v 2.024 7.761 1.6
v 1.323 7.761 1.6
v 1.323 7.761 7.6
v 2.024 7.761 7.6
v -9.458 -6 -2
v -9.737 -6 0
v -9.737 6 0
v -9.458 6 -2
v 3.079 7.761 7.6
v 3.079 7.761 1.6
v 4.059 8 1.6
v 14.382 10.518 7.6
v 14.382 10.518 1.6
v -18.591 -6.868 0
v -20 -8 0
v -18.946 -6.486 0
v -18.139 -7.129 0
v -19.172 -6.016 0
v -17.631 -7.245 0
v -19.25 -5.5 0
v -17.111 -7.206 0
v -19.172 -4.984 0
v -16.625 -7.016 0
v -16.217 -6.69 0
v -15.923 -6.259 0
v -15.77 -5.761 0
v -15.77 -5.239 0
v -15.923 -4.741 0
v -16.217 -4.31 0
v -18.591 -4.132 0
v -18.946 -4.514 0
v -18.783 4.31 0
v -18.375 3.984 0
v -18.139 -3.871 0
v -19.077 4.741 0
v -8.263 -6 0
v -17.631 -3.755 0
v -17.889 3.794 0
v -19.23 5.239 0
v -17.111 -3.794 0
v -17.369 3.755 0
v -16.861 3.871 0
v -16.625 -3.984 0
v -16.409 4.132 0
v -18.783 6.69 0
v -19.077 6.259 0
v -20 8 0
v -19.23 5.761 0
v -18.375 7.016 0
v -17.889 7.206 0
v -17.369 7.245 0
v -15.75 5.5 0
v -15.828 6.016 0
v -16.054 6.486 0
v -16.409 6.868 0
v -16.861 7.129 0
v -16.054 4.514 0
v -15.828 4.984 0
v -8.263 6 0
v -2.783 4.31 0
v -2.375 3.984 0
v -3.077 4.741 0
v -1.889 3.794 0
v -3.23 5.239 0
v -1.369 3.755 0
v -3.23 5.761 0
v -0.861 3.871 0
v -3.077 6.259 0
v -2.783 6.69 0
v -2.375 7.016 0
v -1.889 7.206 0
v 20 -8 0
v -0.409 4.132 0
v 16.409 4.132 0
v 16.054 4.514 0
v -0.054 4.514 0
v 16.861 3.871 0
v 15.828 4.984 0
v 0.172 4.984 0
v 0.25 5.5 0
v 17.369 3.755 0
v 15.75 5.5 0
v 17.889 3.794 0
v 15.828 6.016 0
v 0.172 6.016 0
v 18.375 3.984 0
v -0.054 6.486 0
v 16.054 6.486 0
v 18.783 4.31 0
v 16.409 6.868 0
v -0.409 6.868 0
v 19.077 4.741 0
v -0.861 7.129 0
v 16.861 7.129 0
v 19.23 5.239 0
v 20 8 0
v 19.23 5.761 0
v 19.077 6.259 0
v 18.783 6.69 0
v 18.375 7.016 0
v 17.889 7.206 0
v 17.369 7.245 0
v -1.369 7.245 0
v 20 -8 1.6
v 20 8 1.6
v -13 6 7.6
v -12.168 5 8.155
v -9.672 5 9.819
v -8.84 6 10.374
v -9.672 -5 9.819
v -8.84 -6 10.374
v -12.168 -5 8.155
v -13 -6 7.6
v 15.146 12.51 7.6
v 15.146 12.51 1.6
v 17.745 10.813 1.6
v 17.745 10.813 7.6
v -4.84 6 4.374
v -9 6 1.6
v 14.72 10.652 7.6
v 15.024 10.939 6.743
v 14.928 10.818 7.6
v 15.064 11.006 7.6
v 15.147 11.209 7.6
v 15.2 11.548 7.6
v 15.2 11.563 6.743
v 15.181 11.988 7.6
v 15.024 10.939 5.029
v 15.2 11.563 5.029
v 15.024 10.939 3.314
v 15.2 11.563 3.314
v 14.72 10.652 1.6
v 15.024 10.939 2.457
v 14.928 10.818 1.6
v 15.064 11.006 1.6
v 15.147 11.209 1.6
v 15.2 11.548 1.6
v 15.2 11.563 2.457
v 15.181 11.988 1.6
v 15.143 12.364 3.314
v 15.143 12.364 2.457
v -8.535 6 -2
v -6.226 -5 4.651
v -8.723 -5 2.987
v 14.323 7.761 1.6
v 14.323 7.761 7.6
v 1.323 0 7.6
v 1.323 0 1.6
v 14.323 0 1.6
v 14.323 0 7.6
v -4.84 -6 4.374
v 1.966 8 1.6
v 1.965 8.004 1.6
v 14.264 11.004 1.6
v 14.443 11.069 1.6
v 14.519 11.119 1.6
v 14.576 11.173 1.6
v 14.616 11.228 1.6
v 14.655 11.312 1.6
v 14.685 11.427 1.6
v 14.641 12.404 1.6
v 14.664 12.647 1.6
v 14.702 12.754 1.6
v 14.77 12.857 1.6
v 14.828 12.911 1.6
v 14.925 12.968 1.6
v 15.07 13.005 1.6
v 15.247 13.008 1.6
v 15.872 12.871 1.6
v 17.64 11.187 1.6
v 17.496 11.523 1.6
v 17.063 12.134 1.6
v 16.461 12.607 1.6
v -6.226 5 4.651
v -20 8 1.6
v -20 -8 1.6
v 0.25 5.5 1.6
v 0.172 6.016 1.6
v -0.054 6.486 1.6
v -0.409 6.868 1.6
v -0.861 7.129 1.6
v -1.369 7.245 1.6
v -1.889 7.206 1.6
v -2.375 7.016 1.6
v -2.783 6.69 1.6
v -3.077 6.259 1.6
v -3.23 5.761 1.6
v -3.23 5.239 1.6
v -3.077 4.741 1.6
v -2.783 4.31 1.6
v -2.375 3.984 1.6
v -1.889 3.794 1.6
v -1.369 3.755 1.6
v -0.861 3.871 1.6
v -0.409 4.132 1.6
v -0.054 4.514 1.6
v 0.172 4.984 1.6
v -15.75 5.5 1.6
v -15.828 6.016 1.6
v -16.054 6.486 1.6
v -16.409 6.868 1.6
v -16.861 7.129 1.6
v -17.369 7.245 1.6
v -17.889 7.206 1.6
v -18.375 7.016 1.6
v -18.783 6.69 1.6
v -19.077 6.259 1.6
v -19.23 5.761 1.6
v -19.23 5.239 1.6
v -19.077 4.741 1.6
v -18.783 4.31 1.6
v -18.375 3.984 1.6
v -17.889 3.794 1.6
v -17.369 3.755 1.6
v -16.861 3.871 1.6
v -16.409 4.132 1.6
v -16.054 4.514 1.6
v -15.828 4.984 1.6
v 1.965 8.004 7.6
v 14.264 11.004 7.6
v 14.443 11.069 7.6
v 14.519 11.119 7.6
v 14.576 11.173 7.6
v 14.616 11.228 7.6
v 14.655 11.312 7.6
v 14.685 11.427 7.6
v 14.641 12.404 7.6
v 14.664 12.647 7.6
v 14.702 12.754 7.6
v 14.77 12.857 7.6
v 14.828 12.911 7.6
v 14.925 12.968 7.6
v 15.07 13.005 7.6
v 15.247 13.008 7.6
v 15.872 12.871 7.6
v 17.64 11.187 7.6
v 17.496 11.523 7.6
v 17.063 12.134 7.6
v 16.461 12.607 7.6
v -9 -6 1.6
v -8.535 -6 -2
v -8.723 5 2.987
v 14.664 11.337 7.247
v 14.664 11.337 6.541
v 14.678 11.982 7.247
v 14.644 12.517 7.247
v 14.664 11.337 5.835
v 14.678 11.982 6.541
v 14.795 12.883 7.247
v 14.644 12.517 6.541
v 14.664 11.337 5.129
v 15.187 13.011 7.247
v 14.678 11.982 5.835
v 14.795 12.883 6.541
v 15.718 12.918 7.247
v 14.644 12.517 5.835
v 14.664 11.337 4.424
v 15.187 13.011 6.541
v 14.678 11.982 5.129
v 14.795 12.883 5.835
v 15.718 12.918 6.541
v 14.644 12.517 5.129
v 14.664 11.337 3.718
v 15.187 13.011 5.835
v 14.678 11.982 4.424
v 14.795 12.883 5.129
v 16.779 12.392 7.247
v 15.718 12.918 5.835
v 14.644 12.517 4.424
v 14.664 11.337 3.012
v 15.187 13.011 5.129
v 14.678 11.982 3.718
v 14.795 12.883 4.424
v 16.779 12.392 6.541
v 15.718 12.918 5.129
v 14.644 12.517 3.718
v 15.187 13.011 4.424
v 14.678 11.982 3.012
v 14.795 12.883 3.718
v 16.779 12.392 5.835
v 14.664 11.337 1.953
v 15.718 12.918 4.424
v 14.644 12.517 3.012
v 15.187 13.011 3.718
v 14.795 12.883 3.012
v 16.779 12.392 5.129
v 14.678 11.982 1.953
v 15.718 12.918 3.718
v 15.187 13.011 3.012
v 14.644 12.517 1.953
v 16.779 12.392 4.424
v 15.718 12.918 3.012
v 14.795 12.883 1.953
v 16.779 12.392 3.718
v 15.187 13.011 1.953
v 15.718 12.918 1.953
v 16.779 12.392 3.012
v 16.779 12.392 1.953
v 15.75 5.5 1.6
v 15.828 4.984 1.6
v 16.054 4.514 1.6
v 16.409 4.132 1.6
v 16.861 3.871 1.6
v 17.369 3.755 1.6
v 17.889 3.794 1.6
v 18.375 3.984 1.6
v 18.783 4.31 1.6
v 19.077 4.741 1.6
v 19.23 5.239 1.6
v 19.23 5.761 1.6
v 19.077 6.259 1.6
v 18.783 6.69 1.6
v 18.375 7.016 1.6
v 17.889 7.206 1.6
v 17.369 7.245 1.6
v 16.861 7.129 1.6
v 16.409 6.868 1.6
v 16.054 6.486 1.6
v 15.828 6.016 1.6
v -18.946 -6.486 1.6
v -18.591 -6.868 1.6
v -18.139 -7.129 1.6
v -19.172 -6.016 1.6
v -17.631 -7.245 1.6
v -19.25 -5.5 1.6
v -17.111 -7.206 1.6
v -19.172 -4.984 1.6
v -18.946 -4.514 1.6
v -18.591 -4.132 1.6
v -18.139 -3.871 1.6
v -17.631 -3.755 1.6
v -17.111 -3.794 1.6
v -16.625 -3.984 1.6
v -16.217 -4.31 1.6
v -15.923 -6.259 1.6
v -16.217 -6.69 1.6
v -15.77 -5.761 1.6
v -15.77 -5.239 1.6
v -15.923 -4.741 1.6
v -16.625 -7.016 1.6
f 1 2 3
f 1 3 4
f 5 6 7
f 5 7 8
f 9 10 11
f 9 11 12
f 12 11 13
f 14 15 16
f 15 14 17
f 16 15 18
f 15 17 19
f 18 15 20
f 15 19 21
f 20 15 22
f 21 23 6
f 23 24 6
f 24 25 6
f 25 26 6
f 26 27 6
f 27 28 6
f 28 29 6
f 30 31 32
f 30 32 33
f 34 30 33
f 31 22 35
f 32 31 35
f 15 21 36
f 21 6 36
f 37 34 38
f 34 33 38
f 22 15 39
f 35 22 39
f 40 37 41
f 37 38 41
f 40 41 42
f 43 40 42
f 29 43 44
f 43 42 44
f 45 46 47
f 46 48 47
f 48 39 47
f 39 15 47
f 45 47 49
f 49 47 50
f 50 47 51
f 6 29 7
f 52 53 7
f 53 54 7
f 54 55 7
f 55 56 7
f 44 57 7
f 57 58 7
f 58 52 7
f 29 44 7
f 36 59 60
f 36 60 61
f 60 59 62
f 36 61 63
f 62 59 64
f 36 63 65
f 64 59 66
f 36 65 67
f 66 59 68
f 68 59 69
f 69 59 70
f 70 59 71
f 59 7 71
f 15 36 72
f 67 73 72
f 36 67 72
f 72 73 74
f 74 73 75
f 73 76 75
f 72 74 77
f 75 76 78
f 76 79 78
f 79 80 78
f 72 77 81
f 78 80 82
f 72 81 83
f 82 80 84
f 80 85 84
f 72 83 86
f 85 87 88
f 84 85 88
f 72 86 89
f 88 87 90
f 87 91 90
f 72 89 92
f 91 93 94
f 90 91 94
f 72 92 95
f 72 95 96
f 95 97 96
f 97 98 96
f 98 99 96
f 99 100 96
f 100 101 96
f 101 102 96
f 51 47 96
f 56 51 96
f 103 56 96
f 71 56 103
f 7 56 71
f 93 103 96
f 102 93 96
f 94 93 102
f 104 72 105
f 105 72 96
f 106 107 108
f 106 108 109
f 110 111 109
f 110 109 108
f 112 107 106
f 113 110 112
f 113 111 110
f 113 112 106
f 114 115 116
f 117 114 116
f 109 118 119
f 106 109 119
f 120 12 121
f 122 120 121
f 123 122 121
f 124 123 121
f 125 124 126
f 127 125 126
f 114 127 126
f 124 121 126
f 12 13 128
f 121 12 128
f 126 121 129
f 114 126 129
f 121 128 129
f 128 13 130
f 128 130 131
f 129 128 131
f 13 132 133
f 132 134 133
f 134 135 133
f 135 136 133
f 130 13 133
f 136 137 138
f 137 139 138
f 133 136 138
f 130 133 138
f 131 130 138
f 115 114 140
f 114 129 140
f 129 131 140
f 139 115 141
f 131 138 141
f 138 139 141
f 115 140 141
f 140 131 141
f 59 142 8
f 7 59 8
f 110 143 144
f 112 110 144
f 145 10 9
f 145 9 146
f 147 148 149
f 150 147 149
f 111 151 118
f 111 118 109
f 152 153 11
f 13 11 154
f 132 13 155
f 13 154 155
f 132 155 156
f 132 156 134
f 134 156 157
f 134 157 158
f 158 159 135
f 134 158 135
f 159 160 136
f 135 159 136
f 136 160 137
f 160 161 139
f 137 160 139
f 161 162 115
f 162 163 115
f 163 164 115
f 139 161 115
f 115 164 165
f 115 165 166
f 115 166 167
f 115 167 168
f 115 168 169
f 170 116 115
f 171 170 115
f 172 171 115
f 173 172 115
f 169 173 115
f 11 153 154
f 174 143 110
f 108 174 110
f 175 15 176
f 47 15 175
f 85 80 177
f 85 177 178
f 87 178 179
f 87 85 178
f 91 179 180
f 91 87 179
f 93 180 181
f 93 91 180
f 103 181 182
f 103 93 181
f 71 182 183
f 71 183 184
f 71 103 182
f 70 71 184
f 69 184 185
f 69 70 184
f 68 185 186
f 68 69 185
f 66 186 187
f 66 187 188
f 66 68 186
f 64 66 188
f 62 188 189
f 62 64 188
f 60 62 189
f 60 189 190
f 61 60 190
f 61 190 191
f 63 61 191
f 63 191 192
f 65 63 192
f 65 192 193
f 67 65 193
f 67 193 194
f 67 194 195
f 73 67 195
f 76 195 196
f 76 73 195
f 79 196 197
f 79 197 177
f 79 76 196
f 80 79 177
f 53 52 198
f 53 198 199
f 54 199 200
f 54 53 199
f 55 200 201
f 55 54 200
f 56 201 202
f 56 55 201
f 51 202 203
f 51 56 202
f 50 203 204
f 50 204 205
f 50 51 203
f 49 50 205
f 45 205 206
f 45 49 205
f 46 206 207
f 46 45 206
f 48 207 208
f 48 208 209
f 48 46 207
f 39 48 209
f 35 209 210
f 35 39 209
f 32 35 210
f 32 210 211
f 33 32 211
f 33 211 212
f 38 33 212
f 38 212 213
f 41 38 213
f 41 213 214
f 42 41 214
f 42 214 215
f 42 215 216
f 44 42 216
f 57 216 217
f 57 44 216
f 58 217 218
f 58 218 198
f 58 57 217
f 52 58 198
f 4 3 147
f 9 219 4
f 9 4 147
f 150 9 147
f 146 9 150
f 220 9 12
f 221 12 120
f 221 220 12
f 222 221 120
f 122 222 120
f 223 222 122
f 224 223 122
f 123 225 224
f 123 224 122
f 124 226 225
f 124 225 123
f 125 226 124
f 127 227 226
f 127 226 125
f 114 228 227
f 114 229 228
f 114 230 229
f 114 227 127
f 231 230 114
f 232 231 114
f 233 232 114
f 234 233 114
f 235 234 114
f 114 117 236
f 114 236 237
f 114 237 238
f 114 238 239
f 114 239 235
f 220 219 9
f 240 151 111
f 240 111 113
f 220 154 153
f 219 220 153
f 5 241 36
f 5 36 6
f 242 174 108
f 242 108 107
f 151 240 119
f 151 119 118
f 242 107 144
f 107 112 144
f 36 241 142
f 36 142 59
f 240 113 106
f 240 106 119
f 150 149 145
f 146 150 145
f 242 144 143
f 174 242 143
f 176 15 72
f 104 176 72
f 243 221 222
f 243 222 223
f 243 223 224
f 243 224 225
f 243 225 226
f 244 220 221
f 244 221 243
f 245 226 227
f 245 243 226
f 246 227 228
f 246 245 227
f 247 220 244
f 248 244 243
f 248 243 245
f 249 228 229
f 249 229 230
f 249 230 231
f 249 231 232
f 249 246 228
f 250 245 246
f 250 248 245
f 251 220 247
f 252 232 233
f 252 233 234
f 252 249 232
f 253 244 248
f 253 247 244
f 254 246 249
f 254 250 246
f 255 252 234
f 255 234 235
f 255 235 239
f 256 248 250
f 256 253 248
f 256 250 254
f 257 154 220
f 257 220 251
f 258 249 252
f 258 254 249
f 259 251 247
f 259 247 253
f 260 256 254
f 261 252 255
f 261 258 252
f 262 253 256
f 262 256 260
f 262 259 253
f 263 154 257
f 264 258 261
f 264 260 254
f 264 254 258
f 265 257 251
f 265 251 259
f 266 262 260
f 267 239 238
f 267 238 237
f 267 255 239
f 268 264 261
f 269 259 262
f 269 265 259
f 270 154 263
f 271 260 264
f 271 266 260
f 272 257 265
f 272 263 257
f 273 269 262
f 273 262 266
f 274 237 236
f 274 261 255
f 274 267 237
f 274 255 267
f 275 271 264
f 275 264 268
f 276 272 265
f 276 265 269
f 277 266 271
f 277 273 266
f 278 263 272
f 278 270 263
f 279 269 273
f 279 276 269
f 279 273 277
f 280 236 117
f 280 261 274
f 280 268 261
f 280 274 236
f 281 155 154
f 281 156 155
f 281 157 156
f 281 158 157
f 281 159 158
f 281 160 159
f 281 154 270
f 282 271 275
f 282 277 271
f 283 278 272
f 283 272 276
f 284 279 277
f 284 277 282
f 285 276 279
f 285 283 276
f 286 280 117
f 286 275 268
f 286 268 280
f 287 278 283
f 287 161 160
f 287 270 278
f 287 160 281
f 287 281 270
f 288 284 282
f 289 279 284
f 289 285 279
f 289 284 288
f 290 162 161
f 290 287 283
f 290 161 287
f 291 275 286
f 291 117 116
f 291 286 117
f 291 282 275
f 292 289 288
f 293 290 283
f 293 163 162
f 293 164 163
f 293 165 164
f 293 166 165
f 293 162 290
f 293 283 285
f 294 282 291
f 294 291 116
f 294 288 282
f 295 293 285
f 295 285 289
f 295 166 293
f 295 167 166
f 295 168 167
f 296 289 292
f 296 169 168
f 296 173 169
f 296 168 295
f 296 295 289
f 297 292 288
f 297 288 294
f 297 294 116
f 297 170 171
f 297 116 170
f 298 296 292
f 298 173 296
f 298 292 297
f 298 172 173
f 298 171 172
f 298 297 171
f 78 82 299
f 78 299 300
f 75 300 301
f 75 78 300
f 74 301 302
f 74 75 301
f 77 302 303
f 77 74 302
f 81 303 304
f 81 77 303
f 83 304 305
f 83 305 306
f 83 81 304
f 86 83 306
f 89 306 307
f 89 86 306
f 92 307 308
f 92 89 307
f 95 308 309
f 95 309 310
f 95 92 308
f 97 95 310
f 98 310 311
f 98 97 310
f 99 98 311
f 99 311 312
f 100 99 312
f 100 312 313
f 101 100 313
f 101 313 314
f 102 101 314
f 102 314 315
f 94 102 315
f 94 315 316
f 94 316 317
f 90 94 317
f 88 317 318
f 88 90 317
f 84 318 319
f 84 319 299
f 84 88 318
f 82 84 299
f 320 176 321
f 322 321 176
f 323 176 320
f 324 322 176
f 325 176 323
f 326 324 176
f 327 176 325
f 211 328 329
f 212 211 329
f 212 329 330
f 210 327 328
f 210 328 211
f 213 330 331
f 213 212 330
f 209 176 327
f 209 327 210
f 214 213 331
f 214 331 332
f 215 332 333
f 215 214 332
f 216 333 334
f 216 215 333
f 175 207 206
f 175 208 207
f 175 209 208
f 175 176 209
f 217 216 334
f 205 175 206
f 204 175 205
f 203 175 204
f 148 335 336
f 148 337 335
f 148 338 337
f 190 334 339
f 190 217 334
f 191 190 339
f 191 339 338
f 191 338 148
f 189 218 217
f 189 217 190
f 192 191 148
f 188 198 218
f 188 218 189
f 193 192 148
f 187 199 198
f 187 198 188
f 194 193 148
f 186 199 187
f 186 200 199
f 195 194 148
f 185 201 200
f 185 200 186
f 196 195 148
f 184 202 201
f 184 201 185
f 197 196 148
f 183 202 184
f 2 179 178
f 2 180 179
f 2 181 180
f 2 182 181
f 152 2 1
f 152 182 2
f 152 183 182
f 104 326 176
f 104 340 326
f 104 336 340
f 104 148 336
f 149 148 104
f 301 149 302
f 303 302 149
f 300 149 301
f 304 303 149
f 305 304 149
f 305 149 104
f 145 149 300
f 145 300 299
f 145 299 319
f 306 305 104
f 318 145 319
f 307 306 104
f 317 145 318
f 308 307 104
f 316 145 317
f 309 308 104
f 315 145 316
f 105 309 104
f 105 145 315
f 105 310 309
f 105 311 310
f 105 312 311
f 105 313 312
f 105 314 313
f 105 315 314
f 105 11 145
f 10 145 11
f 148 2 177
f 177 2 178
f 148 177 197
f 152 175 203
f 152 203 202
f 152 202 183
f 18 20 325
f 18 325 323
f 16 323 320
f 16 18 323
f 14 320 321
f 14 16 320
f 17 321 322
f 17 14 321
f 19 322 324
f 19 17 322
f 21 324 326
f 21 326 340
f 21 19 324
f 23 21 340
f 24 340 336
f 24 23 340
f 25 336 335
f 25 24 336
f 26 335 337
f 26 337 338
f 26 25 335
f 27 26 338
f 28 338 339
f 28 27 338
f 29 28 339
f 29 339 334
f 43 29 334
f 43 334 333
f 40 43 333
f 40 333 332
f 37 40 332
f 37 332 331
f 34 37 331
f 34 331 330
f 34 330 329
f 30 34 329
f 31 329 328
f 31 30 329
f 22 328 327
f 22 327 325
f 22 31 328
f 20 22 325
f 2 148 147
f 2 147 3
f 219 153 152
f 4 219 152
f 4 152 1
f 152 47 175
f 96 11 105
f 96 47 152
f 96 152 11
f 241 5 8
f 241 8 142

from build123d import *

# Parameters (mm, degrees)
SKETCH1_W           = 40
SKETCH1_H           = 16
SKETCH1_R           = 1.75
EXTRUDE1_DEPTH      = 1.6
SKETCH2_W           = 13
SKETCH2_H           = 7.760900167
EXTRUDE2_DEPTH      = 6
EXTRUDE_THIN1_START = -6
EXTRUDE_THIN1_DEPTH = 6
EXTRUDE3_DEPTH      = 6
EXTRUDE3_DEPTH_BACK = 6
SHELL1_T            = -1
EXTRUDE4_DEPTH      = 6
EXTRUDE4_DEPTH_BACK = 6


# Read off the part's stored shape, not the designer's step: Extrude-Thin1
with BuildPart() as part:
    # Sketch1 → Extrude1 (new body)
    with BuildSketch(Plane.XY):
        Rectangle(SKETCH1_W, SKETCH1_H)
        with Locations((-17.5, 5.5)):
            Circle(SKETCH1_R, mode=Mode.SUBTRACT)
        with Locations(Location((17.5, 5.5, 0), (0, 0, 180))):
            Circle(SKETCH1_R, mode=Mode.SUBTRACT)
        with Locations(Location((-17.5, -5.5, 0), (0, 0, 180))):
            Circle(SKETCH1_R, mode=Mode.SUBTRACT)
        with Locations((-1.5, 5.5)):
            Circle(SKETCH1_R, mode=Mode.SUBTRACT)
    extrude(amount=EXTRUDE1_DEPTH)

    # Sketch2 → Extrude2 (add)
    with BuildSketch(Plane.XY.offset(1.6)):
        with Locations((7.822887278, 3.880450084)):
            Rectangle(SKETCH2_W, SKETCH2_H)
    extrude(amount=EXTRUDE2_DEPTH)

    # Extrude-Thin1 outline → Extrude-Thin1 (add)
    with BuildSketch(Plane.XY.offset(7.6).offset(EXTRUDE_THIN1_START)):
        with BuildLine():
            Line((3.079167928, 7.760900167), (14.382132424, 10.51802157))
            add(Edge.make_bspline(
                [(14.382132424, 10.51802157), (14.527945212, 10.553589545), (14.655507009, 10.60736065), (14.871684027, 10.750671126), (14.959206507, 10.840402341), (15.088857099, 11.037222478), (15.131248766, 11.143247489), (15.184864162, 11.354576745), (15.196559854, 11.46025225), (15.207444647, 11.769684033), (15.183069736, 11.967685168), (15.154835021, 12.22188203), (15.146676484, 12.299323613), (15.139586524, 12.42881224), (15.141421953, 12.481018205), (15.14607356, 12.510227856)],
                knots=[0, 0, 0, 0, 0.125, 0.125, 0.25, 0.25, 0.375, 0.375, 0.5, 0.5, 0.75, 0.75, 0.875, 0.875, 1, 1, 1, 1], degree=3))
            Line((15.14607356, 12.510227856), (17.744563111, 10.812754625))
            add(Edge.make_bspline(
                [(14.263642133, 11.003778764), (14.402173401, 11.037570564), (14.486352869, 11.086615299), (14.60208936, 11.194032624), (14.638108268, 11.255779889), (14.689139196, 11.41869456), (14.700995458, 11.519225736), (14.701883987, 11.741129862), (14.691284391, 11.861642827), (14.665305455, 12.103047364), (14.649847616, 12.223464026), (14.64054286, 12.399920995), (14.639713982, 12.458191462), (14.64847118, 12.576397683), (14.657712888, 12.636731658), (14.701579266, 12.761960135), (14.738209693, 12.82829366), (14.824093983, 12.910144757), (14.857964765, 12.934167296), (14.927645174, 12.970329572), (14.962359684, 12.982536879), (15.06302261, 13.00829889), (15.125868218, 13.011876971), (15.248220417, 13.009575456), (15.30794798, 13.003097855), (15.485077928, 12.976467745), (15.599675402, 12.950856525), (15.836925446, 12.885317177), (15.957201353, 12.844881865), (16.31738791, 12.697890775), (16.556855556, 12.565603074), (17.000758871, 12.217680393), (17.205056858, 12.001744635), (17.539491556, 11.47688197), (17.669190892, 11.168235428), (17.744563111, 10.812754625)],
                knots=[0, 0, 0, 0, 0.0625, 0.0625, 0.125, 0.125, 0.1875, 0.1875, 0.25, 0.25, 0.3125, 0.3125, 0.34375, 0.34375, 0.375, 0.375, 0.40625, 0.40625, 0.421875, 0.421875, 0.4375, 0.4375, 0.46875, 0.46875, 0.5, 0.5, 0.5625, 0.5625, 0.625, 0.625, 0.75, 0.75, 0.875, 0.875, 1, 1, 1, 1], degree=3))
            Line((14.263642133, 11.003778764), (1.96498403, 8.003778764))
            Line((1.96498403, 8.003778764), (2.024229176, 7.760900167))
            Line((2.024229176, 7.760900167), (3.079167928, 7.760900167))
        make_face()
    extrude(amount=EXTRUDE_THIN1_DEPTH)

    # Sketch5 → Extrude4 (add, two sides: drawn at the far end of the back side and taken through both)
    with BuildSketch(Plane(origin=(0, 0, 0), x_dir=(1, 0, 0), z_dir=(0, 1, 0)).offset(-EXTRUDE4_DEPTH_BACK)):
        Polygon((-9.736964899, 0), (-9.458111879, 2), (-8.535084126, 2), (-8.263035101, 0), align=None)
    extrude(amount=EXTRUDE4_DEPTH + EXTRUDE4_DEPTH_BACK)


with BuildPart() as body_2:
    # Sketch4 → Extrude3 (new, two sides: drawn at the far end of the back side and taken through both)
    with BuildSketch(Plane(origin=(0, 0, 0), x_dir=(1, 0, 0), z_dir=(0, 1, 0)).offset(-EXTRUDE3_DEPTH_BACK)):
        Polygon((-13, -7.6), (-9, -1.6), (-4.839748528, -4.373500981), (-8.839748528, -10.373500981), align=None)
    extrude(amount=EXTRUDE3_DEPTH + EXTRUDE3_DEPTH_BACK)

    # Shell1
    shell1_openings = [body_2.faces().sort_by_distance(p)[0] for p in [
        (-10.919874264, 0, 8.986750491),
    ]]
    offset(amount=SHELL1_T, openings=shell1_openings, kind=Kind.INTERSECTION)


solid = Compound([part.part, body_2.part])
